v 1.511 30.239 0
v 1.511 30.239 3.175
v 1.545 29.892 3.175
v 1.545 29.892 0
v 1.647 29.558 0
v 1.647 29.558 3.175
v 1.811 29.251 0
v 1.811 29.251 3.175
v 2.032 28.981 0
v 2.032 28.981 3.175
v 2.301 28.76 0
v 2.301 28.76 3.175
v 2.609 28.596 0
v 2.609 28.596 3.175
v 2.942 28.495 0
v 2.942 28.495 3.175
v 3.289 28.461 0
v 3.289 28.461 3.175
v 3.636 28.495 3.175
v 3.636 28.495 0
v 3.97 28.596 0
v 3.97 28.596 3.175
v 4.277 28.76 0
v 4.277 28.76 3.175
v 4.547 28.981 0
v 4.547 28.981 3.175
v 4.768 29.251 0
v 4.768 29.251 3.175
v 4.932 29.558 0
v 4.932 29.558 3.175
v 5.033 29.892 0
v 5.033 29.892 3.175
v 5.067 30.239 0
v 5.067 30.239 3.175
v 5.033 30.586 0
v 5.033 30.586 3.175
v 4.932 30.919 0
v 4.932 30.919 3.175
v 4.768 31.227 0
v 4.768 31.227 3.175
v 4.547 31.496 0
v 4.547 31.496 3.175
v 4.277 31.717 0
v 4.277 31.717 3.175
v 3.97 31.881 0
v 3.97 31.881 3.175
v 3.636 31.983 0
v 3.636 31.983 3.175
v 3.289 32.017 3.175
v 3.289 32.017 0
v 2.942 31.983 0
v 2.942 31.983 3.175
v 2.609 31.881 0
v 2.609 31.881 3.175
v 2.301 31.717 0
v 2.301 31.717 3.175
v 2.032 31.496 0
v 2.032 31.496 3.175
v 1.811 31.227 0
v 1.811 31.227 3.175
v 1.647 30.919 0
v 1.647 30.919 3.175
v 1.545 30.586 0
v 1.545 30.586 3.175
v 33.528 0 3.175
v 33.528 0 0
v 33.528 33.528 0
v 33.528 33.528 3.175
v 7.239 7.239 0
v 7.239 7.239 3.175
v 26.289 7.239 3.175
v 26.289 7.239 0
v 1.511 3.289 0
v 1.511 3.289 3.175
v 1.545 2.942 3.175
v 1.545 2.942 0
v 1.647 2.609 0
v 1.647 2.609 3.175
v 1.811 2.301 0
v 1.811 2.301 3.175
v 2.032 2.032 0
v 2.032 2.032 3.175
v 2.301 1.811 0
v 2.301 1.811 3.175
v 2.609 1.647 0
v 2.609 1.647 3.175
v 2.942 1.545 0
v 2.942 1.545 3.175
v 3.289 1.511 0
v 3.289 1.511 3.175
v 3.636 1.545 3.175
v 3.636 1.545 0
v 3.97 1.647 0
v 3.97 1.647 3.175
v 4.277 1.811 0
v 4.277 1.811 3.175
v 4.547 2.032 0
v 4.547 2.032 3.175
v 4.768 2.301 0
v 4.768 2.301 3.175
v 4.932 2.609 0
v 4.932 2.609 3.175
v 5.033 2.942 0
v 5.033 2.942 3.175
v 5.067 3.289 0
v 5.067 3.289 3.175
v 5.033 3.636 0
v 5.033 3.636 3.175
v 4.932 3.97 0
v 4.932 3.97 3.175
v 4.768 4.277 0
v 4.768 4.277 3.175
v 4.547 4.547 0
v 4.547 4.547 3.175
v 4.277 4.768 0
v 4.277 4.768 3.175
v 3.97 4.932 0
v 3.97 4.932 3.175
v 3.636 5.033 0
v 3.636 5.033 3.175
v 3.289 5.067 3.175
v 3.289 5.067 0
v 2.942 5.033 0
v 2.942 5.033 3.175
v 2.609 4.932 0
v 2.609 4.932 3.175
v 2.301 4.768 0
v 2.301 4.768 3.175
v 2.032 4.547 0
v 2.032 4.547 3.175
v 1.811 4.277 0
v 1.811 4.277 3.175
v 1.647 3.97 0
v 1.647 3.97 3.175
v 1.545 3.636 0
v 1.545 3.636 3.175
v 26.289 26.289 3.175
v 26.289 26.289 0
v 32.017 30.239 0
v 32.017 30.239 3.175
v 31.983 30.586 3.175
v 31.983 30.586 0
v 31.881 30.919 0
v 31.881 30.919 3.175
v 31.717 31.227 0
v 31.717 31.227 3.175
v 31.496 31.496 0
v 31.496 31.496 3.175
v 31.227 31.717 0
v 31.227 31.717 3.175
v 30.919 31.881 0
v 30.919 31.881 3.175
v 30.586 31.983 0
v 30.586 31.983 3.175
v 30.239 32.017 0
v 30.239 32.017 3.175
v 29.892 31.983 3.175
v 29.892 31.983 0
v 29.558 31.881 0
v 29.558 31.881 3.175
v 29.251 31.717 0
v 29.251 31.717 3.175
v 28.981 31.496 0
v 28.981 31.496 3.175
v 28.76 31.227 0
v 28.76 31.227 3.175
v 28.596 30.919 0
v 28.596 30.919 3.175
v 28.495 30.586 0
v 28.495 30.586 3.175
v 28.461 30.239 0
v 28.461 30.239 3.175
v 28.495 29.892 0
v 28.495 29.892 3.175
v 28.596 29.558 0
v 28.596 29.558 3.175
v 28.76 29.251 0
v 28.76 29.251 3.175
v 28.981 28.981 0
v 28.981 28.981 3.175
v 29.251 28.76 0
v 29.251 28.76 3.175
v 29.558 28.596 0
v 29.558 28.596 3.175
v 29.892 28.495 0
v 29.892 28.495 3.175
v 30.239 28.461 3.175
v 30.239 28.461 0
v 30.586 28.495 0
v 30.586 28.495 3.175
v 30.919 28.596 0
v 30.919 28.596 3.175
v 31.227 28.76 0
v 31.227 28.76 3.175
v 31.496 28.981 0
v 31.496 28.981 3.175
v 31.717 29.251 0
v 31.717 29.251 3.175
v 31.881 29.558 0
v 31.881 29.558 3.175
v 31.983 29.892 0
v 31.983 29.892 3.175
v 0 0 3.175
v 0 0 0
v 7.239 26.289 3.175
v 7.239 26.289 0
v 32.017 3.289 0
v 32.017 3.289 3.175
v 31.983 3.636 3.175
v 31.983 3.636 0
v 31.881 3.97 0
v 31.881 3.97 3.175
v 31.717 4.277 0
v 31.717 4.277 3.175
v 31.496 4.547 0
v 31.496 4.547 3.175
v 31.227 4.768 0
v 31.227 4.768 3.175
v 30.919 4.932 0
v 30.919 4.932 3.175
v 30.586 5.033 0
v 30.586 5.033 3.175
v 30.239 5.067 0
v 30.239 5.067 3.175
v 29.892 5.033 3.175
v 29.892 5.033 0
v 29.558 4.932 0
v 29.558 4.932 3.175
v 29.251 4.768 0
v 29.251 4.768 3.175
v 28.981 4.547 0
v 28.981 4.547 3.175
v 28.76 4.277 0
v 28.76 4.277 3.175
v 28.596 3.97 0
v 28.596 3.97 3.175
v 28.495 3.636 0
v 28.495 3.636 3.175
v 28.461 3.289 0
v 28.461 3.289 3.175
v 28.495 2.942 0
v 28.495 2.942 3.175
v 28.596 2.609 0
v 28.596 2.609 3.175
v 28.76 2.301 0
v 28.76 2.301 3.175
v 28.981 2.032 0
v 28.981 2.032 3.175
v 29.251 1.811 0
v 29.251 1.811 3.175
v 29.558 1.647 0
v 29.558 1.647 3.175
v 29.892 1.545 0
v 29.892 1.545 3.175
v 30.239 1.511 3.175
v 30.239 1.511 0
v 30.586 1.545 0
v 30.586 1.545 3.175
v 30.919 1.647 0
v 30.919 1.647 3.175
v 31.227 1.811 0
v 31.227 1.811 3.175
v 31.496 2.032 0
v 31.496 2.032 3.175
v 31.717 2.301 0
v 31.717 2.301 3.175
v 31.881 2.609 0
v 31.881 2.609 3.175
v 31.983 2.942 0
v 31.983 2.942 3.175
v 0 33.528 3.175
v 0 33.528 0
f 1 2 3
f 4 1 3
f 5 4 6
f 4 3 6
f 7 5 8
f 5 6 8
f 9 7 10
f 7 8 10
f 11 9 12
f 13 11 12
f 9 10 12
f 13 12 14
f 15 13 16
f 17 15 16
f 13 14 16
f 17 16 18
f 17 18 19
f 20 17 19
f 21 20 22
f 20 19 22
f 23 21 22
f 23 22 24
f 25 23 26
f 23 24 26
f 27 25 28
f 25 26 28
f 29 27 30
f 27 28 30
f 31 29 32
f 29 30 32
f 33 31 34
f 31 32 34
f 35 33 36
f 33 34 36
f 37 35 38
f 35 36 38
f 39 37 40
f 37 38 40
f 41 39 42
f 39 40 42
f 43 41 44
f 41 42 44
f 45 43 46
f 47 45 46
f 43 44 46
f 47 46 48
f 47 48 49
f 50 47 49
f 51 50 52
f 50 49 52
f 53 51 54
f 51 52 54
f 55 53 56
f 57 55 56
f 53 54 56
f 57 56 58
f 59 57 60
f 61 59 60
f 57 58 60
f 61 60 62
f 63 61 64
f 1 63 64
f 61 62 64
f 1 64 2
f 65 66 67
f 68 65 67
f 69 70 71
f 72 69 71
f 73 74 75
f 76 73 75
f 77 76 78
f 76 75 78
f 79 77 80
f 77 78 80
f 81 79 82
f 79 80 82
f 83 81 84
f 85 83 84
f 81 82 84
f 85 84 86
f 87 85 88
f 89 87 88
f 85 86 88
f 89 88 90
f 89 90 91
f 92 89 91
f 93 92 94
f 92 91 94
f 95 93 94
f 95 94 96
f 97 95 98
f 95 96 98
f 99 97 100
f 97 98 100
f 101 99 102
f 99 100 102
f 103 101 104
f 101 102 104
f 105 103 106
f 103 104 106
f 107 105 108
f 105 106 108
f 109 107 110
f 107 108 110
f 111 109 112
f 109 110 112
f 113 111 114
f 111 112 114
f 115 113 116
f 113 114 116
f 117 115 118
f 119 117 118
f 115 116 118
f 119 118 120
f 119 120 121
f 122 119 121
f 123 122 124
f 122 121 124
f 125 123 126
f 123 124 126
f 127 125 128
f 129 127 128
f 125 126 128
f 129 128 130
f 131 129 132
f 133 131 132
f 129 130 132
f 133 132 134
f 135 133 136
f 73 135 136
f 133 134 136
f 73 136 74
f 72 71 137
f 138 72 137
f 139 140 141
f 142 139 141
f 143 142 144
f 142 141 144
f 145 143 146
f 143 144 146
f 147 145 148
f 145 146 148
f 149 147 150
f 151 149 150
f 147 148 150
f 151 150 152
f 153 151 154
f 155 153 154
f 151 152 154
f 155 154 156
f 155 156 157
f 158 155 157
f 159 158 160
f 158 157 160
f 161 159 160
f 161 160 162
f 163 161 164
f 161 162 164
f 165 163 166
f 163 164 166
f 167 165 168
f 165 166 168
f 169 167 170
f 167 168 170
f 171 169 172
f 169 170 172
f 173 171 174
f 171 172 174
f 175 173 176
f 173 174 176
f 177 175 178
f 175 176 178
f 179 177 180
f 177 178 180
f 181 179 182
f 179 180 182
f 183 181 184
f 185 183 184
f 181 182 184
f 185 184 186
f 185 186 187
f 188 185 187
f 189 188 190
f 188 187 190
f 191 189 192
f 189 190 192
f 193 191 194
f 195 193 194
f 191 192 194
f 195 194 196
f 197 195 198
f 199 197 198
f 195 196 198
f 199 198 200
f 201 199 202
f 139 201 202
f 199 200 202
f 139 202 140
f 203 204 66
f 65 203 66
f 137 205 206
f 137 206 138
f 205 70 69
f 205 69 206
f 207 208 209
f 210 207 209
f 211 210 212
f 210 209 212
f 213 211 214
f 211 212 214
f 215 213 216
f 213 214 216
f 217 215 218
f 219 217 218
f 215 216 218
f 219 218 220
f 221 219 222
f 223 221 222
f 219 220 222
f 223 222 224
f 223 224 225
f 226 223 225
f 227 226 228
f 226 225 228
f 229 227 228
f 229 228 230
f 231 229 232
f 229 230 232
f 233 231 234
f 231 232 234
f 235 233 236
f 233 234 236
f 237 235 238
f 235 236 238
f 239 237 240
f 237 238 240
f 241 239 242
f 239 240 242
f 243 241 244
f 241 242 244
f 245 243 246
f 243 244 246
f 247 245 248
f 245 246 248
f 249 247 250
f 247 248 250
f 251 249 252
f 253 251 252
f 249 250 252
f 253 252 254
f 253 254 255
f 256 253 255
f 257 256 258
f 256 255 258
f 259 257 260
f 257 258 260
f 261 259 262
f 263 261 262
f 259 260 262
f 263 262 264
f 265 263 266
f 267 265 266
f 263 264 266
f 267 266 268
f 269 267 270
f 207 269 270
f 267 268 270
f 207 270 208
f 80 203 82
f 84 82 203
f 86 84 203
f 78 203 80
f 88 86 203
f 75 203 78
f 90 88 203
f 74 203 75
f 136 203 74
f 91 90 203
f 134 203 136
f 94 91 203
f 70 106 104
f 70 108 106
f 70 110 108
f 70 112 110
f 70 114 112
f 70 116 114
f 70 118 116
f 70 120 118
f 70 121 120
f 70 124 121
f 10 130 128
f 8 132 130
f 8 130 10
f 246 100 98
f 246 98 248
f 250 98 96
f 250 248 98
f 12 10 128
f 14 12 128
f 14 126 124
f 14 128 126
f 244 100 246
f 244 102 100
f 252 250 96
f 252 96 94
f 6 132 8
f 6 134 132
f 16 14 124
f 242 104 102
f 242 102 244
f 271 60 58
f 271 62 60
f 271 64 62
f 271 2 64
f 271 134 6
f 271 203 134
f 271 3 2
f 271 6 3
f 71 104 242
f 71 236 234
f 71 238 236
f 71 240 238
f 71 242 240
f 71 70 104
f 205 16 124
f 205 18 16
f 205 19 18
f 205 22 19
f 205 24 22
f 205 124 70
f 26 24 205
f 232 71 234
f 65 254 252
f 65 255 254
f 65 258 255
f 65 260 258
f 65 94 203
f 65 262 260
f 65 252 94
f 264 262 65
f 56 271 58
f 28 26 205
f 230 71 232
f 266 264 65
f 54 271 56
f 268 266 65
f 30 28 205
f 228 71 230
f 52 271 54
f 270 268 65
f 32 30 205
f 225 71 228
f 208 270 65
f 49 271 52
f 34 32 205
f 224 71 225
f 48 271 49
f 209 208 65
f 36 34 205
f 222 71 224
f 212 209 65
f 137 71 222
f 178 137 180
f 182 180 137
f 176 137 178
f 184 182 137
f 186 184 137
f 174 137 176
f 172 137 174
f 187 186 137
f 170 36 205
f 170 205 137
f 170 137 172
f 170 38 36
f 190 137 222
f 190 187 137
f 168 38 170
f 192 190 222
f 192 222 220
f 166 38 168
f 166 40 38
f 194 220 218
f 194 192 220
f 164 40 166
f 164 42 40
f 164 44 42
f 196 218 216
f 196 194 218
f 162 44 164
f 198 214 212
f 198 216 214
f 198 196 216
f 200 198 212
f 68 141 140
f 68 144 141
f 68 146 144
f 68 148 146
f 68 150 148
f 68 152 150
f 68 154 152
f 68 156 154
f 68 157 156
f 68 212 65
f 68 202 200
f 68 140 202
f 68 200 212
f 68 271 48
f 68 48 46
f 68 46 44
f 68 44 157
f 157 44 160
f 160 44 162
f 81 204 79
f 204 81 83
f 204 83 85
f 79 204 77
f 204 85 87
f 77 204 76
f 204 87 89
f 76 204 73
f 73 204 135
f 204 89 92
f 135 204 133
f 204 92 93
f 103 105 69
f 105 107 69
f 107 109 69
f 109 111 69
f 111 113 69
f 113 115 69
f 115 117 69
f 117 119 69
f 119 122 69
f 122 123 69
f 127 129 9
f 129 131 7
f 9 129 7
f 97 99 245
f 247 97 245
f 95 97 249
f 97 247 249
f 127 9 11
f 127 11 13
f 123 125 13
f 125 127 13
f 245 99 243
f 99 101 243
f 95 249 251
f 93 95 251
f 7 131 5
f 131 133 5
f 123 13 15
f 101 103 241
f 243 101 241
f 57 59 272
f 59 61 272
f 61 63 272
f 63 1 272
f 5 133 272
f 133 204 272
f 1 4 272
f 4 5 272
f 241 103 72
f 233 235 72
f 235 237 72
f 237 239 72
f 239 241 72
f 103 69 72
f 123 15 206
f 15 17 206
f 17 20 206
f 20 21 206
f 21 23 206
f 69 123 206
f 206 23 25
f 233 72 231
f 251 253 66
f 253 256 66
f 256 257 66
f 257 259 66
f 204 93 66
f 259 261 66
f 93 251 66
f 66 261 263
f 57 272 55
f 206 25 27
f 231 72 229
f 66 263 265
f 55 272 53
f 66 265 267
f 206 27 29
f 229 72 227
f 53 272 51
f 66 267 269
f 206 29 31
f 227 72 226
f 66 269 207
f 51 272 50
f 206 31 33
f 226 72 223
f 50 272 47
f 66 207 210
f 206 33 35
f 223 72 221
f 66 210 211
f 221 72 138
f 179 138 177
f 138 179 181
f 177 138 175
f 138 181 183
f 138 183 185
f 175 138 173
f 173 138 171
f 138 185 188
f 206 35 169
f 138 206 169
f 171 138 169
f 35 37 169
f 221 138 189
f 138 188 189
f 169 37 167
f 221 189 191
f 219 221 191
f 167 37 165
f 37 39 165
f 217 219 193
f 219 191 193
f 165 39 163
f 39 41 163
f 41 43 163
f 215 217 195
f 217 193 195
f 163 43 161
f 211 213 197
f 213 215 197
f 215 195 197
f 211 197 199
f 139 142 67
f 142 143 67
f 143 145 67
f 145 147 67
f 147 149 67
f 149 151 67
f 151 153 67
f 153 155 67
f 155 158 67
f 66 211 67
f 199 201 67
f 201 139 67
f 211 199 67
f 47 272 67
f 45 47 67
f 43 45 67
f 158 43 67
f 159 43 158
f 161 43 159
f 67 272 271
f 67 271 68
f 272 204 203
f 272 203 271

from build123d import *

# Parameters (mm, degrees)
SKETCH1_W           = 33.528
SKETCH1_H           = 33.528
BOSS_EXTRUDE1_DEPTH = 3.175
SKETCH2_W           = 19.05
SKETCH2_H           = 19.05
CUT_EXTRUDE1_DEPTH  = 3.175
SKETCH3_R           = 1.778
CUT_EXTRUDE2_DEPTH  = 3.175


with BuildPart() as part:
    # Sketch1 → Boss-Extrude1 (new body)
    with BuildSketch(Plane.XY):
        with Locations((16.764, 16.764)):
            Rectangle(SKETCH1_W, SKETCH1_H)
    extrude(amount=BOSS_EXTRUDE1_DEPTH)

    # Sketch2 → Cut-Extrude1 (cut)
    with BuildSketch(Plane.XY.offset(3.175)):
        with Locations((16.764, 16.764)):
            Rectangle(SKETCH2_W, SKETCH2_H)
    extrude(amount=-CUT_EXTRUDE1_DEPTH, mode=Mode.SUBTRACT)

    # Sketch3 → Cut-Extrude2 (cut)
    with BuildSketch(Plane.XY.offset(3.175)):
        with Locations((30.2387, 30.2387)):
            Circle(SKETCH3_R)
        with Locations((30.2387, 3.2893)):
            Circle(SKETCH3_R)
        with Locations(Location((3.2893, 3.2893, 0), (0, 0, 180))):
            Circle(SKETCH3_R)
        with Locations(Location((3.2893, 30.2387, 0), (0, 0, 180))):
            Circle(SKETCH3_R)
    extrude(amount=-CUT_EXTRUDE2_DEPTH, mode=Mode.SUBTRACT)


solid = part.part
